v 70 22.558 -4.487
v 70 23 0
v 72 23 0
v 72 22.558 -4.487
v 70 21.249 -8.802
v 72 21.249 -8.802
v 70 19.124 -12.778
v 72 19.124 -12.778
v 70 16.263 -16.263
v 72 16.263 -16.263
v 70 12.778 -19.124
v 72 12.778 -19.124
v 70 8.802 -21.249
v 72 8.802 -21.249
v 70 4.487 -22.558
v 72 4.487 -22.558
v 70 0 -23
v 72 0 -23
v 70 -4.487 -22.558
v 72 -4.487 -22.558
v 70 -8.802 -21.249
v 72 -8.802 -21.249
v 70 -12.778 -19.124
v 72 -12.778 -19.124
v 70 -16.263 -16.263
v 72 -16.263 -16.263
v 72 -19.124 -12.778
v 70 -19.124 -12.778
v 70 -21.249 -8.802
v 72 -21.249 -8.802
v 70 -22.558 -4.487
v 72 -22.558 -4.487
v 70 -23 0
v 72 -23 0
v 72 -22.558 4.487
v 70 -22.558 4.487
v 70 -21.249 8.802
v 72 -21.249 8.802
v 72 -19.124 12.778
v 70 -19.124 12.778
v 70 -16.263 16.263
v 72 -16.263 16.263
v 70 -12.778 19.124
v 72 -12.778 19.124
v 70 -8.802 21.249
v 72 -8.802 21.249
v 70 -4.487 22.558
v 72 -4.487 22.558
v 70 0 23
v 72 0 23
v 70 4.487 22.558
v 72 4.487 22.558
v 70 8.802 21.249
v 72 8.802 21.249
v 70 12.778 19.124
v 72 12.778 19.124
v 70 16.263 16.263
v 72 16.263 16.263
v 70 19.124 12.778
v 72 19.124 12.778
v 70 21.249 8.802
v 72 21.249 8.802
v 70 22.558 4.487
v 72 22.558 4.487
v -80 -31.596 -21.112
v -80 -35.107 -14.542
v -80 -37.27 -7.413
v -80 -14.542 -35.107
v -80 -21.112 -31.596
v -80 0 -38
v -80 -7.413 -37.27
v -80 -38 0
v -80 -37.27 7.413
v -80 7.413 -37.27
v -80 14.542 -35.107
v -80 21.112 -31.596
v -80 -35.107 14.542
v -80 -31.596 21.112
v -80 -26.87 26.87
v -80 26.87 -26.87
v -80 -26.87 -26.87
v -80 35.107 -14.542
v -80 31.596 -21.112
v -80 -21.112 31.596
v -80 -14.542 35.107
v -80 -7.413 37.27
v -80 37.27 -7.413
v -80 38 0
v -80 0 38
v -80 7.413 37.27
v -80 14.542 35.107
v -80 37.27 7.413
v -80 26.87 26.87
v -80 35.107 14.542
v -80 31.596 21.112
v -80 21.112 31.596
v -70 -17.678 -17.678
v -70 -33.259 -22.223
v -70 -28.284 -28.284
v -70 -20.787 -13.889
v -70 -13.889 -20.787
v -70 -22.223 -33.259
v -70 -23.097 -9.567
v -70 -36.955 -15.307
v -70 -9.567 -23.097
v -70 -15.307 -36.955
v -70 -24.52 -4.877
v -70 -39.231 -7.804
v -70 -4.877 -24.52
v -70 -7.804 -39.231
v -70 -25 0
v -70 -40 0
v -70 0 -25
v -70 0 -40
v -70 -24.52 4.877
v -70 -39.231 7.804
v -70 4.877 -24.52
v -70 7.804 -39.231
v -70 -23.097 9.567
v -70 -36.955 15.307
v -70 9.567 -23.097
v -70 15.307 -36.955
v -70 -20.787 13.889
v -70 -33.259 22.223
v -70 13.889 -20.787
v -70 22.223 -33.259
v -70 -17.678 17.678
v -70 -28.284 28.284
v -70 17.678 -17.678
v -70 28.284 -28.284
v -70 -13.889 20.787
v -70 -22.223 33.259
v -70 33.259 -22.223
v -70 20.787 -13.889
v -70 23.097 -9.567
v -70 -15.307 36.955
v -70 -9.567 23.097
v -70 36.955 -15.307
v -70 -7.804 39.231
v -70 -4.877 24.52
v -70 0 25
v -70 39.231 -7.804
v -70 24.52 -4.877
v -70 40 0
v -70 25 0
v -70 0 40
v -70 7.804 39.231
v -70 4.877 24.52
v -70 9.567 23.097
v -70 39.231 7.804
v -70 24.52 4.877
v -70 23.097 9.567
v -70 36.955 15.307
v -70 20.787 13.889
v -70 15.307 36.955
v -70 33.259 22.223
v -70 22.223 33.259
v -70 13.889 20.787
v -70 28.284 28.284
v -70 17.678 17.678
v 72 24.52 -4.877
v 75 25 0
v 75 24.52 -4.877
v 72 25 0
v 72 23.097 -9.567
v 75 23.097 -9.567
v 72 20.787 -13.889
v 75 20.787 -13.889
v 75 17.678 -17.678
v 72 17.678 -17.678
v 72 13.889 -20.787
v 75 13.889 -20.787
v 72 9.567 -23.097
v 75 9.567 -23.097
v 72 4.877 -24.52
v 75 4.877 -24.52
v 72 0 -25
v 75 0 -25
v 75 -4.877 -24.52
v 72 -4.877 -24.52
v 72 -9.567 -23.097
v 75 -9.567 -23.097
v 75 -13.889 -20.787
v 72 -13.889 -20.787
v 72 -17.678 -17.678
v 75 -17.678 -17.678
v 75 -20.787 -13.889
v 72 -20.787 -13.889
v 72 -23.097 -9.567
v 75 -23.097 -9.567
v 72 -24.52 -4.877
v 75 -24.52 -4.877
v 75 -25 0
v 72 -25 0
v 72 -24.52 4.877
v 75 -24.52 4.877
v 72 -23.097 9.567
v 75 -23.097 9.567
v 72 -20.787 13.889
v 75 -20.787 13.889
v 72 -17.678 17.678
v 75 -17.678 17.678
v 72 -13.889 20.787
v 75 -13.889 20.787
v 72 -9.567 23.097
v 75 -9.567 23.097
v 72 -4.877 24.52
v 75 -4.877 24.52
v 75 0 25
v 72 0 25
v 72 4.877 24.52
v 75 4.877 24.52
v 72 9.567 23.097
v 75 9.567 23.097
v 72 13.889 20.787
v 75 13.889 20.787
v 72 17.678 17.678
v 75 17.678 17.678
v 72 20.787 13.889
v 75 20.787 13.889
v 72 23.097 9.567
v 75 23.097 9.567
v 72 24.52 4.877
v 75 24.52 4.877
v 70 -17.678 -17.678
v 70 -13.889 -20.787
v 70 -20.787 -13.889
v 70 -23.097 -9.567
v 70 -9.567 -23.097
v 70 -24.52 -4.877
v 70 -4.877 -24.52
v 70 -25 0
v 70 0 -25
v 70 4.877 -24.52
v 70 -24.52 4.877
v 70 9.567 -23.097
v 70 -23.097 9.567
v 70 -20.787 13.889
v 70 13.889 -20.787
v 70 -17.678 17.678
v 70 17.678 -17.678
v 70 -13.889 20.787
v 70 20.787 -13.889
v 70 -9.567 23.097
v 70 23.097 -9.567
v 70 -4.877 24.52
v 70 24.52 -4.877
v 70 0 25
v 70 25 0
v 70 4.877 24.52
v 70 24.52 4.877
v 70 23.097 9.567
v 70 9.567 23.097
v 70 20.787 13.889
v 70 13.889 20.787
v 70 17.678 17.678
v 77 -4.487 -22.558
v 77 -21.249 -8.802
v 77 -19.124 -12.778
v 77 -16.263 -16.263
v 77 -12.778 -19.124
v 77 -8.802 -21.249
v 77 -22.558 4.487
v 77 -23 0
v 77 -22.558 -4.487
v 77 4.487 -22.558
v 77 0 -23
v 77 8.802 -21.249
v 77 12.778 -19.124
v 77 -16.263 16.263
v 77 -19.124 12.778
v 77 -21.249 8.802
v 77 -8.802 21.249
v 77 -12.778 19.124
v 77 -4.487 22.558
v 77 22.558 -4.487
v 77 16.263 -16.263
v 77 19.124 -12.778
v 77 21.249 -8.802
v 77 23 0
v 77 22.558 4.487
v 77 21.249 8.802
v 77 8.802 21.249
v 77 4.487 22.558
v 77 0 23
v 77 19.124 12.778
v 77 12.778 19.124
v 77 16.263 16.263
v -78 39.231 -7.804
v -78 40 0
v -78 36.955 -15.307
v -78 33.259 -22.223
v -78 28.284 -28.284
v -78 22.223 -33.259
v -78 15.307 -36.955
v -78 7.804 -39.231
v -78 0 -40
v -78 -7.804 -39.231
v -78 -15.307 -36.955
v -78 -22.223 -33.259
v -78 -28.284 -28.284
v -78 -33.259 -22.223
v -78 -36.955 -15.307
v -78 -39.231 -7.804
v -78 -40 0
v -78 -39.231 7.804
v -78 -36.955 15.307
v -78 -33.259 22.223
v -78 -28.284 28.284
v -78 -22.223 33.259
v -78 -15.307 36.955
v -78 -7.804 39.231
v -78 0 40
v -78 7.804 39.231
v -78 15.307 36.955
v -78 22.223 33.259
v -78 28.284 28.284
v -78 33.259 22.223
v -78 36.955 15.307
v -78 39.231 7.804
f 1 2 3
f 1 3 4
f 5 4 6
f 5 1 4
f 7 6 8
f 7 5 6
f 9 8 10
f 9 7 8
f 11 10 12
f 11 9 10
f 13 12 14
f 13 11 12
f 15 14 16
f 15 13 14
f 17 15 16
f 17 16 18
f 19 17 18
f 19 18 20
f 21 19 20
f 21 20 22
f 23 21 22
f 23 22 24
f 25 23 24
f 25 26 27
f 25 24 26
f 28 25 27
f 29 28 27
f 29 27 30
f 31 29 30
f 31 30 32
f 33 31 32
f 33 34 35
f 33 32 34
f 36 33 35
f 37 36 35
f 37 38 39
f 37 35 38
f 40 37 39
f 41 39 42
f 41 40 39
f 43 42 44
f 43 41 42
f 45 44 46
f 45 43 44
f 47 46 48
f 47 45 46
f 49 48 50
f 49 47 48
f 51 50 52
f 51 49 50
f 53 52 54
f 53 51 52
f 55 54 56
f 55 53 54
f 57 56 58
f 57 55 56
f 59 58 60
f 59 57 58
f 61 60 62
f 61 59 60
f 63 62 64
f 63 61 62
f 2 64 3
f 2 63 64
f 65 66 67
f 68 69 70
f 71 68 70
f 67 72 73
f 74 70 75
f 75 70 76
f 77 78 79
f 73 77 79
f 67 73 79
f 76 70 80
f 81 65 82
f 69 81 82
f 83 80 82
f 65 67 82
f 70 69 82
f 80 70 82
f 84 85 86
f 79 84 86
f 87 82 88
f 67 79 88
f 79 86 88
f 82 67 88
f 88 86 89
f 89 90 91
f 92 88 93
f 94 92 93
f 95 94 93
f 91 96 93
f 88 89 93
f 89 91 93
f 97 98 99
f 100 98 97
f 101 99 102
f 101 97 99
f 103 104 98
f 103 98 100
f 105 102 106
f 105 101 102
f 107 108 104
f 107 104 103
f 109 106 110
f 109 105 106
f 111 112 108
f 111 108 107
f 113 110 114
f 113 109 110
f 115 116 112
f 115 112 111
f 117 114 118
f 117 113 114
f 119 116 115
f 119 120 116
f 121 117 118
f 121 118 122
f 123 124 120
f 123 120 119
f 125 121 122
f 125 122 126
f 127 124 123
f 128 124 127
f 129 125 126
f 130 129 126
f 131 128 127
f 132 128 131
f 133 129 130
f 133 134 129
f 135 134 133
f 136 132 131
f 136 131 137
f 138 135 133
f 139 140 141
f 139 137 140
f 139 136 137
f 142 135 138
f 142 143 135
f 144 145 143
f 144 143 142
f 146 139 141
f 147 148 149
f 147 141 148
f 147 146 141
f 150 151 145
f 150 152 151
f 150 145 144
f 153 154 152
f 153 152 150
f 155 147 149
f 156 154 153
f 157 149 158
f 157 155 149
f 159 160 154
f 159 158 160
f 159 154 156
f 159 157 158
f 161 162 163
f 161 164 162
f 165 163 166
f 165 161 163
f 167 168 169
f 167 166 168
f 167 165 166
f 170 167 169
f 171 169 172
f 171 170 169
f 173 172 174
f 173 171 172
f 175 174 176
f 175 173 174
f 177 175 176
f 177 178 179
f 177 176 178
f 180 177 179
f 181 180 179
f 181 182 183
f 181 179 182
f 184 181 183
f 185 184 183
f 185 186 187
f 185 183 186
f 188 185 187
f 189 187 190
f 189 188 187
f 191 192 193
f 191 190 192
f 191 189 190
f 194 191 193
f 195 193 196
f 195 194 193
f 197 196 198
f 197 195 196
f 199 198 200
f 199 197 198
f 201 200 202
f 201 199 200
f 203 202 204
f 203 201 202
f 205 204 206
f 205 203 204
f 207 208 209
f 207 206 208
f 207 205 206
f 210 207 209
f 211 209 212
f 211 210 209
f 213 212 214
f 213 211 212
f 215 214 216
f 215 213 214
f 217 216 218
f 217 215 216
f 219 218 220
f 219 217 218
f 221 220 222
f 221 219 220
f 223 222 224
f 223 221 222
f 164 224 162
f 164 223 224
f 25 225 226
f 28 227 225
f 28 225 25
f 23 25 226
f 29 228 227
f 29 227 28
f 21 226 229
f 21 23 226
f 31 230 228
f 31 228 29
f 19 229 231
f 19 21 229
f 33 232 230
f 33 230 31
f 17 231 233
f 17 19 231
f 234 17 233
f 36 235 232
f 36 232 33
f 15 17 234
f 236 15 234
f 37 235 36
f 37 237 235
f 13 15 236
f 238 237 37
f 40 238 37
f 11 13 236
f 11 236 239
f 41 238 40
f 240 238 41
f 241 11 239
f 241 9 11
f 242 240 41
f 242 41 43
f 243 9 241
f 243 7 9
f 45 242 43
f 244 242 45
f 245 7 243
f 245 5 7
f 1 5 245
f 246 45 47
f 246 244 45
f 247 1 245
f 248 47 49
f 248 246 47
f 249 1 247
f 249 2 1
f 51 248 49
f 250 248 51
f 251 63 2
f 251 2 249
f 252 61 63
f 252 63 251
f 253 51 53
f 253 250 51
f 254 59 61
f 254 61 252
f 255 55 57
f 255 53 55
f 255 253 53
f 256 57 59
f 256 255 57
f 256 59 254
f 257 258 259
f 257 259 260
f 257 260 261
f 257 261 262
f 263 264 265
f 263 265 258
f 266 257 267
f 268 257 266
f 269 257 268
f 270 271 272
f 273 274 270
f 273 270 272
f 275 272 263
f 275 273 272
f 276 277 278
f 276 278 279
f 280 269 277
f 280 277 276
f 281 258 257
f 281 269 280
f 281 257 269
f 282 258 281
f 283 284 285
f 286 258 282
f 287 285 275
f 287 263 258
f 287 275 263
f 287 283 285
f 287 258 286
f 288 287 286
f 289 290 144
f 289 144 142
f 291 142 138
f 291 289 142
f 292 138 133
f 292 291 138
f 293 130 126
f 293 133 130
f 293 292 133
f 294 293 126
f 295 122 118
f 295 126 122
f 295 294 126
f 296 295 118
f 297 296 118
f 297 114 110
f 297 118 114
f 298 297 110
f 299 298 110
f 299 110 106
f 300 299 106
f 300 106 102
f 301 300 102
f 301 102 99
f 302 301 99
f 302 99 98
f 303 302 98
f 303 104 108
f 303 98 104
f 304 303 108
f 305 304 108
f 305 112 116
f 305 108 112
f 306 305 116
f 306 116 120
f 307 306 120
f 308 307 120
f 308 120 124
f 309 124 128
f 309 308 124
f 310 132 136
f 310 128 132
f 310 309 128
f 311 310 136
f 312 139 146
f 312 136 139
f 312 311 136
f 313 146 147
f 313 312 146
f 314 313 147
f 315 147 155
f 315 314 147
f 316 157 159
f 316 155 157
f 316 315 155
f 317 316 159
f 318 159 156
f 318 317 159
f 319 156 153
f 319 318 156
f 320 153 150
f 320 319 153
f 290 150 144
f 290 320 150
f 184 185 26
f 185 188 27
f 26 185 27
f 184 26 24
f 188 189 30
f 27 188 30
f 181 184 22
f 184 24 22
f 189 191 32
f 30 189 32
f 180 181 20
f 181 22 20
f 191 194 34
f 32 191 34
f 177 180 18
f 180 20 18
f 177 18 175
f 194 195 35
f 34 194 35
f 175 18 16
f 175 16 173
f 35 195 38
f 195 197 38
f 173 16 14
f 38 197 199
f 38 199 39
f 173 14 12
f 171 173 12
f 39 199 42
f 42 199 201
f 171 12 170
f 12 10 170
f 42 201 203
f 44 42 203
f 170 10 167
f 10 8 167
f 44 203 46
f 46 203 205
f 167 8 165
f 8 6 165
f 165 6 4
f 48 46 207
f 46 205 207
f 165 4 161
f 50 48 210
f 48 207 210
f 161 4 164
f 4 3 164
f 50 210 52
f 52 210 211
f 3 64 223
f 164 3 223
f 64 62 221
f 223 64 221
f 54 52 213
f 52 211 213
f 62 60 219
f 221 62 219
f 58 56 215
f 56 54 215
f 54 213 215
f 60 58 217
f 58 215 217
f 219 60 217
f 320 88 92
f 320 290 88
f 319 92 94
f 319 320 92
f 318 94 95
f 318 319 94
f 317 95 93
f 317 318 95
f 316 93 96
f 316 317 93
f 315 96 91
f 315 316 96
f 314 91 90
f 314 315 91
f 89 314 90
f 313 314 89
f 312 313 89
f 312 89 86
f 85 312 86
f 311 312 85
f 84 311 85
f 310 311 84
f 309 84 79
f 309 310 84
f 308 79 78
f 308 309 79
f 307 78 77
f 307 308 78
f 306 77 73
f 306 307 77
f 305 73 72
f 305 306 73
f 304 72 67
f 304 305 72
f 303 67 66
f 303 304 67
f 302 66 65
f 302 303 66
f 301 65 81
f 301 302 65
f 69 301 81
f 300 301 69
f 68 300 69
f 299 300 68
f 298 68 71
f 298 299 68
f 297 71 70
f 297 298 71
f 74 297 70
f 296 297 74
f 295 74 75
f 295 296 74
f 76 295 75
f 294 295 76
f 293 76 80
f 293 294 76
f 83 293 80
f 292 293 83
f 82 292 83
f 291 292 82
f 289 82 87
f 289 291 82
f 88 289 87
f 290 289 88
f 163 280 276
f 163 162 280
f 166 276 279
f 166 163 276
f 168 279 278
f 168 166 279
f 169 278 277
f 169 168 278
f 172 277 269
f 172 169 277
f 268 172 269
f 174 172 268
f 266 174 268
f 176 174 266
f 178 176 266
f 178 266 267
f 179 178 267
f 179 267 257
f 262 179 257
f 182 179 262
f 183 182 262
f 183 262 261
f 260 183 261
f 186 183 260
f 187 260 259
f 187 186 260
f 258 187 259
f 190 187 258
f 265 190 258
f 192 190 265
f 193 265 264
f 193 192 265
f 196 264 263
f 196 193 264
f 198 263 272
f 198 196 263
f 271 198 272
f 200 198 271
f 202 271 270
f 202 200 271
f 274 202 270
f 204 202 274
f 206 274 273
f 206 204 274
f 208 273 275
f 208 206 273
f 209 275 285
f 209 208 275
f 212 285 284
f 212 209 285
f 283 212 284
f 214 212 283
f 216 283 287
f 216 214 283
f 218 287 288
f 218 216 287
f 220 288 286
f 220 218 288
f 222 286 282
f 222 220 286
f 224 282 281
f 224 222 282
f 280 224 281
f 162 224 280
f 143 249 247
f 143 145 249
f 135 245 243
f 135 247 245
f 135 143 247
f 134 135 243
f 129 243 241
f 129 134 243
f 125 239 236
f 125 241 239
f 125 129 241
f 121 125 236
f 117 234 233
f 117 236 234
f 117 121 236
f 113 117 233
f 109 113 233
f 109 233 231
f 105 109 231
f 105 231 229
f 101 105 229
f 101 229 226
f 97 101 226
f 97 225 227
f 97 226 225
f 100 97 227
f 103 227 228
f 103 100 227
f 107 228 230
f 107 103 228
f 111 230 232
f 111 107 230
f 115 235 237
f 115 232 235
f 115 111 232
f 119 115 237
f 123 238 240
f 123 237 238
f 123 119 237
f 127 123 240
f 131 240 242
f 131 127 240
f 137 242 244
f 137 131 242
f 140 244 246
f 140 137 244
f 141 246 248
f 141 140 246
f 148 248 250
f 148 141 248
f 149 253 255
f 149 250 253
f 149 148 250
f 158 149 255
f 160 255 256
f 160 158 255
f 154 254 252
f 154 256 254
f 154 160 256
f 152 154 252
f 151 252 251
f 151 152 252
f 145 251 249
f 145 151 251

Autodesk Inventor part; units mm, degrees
ref_plane "YZ Plane" through (0, 0, 0) normal (1, 0, 0) x (0, 1, 0)
ref_plane "XZ Plane" through (0, 0, 0) normal (0, 1, 0) x (-1, 0, 0)
ref_plane "XY Plane" through (0, 0, 0) normal (0, 0, 1) x (1, 0, 0)
sketch "Skizze1" plane through (0, 0, 0) normal (0, 0, 1) x (1, 0, 0)
  line L0 (-70, 25) -> (-70, 40)
  line L1 (-70, 40) -> (-80, 40)
  line L2 (-80, 40) -> (-80, 0)
  line L3 (-80, 0) -> (77, 0)
  line L4 (77, 0) -> (77, 25)
  line L5 (72, 25) -> (72, 23)
  line L6 (72, 23) -> (70, 23)
  line L7 (70, 23) -> (70, 25)
  line L8 (77, 25) -> (72, 25)
  line L9 (70, 25) -> (-70, 25)
  dimension "d0" = 80
  dimension "d1" = 10
  dimension "d2" = 50
  dimension "d3" = 46
  dimension "d7" = 2
  dimension "d8" = 5
  dimension "d13" = 140
revolve "Drehung1" add sketch "Skizze1" angle 360 about axis through (-80, 0, 0) along (1, 0, 0)
chamfer "Fase1" distance 2 angle 45 1 edges at (-80, -40, 0)
chamfer "Fase2" distance 2 angle 45 1 edges at (77, -25, 0)
properties part number "Boltx50"
